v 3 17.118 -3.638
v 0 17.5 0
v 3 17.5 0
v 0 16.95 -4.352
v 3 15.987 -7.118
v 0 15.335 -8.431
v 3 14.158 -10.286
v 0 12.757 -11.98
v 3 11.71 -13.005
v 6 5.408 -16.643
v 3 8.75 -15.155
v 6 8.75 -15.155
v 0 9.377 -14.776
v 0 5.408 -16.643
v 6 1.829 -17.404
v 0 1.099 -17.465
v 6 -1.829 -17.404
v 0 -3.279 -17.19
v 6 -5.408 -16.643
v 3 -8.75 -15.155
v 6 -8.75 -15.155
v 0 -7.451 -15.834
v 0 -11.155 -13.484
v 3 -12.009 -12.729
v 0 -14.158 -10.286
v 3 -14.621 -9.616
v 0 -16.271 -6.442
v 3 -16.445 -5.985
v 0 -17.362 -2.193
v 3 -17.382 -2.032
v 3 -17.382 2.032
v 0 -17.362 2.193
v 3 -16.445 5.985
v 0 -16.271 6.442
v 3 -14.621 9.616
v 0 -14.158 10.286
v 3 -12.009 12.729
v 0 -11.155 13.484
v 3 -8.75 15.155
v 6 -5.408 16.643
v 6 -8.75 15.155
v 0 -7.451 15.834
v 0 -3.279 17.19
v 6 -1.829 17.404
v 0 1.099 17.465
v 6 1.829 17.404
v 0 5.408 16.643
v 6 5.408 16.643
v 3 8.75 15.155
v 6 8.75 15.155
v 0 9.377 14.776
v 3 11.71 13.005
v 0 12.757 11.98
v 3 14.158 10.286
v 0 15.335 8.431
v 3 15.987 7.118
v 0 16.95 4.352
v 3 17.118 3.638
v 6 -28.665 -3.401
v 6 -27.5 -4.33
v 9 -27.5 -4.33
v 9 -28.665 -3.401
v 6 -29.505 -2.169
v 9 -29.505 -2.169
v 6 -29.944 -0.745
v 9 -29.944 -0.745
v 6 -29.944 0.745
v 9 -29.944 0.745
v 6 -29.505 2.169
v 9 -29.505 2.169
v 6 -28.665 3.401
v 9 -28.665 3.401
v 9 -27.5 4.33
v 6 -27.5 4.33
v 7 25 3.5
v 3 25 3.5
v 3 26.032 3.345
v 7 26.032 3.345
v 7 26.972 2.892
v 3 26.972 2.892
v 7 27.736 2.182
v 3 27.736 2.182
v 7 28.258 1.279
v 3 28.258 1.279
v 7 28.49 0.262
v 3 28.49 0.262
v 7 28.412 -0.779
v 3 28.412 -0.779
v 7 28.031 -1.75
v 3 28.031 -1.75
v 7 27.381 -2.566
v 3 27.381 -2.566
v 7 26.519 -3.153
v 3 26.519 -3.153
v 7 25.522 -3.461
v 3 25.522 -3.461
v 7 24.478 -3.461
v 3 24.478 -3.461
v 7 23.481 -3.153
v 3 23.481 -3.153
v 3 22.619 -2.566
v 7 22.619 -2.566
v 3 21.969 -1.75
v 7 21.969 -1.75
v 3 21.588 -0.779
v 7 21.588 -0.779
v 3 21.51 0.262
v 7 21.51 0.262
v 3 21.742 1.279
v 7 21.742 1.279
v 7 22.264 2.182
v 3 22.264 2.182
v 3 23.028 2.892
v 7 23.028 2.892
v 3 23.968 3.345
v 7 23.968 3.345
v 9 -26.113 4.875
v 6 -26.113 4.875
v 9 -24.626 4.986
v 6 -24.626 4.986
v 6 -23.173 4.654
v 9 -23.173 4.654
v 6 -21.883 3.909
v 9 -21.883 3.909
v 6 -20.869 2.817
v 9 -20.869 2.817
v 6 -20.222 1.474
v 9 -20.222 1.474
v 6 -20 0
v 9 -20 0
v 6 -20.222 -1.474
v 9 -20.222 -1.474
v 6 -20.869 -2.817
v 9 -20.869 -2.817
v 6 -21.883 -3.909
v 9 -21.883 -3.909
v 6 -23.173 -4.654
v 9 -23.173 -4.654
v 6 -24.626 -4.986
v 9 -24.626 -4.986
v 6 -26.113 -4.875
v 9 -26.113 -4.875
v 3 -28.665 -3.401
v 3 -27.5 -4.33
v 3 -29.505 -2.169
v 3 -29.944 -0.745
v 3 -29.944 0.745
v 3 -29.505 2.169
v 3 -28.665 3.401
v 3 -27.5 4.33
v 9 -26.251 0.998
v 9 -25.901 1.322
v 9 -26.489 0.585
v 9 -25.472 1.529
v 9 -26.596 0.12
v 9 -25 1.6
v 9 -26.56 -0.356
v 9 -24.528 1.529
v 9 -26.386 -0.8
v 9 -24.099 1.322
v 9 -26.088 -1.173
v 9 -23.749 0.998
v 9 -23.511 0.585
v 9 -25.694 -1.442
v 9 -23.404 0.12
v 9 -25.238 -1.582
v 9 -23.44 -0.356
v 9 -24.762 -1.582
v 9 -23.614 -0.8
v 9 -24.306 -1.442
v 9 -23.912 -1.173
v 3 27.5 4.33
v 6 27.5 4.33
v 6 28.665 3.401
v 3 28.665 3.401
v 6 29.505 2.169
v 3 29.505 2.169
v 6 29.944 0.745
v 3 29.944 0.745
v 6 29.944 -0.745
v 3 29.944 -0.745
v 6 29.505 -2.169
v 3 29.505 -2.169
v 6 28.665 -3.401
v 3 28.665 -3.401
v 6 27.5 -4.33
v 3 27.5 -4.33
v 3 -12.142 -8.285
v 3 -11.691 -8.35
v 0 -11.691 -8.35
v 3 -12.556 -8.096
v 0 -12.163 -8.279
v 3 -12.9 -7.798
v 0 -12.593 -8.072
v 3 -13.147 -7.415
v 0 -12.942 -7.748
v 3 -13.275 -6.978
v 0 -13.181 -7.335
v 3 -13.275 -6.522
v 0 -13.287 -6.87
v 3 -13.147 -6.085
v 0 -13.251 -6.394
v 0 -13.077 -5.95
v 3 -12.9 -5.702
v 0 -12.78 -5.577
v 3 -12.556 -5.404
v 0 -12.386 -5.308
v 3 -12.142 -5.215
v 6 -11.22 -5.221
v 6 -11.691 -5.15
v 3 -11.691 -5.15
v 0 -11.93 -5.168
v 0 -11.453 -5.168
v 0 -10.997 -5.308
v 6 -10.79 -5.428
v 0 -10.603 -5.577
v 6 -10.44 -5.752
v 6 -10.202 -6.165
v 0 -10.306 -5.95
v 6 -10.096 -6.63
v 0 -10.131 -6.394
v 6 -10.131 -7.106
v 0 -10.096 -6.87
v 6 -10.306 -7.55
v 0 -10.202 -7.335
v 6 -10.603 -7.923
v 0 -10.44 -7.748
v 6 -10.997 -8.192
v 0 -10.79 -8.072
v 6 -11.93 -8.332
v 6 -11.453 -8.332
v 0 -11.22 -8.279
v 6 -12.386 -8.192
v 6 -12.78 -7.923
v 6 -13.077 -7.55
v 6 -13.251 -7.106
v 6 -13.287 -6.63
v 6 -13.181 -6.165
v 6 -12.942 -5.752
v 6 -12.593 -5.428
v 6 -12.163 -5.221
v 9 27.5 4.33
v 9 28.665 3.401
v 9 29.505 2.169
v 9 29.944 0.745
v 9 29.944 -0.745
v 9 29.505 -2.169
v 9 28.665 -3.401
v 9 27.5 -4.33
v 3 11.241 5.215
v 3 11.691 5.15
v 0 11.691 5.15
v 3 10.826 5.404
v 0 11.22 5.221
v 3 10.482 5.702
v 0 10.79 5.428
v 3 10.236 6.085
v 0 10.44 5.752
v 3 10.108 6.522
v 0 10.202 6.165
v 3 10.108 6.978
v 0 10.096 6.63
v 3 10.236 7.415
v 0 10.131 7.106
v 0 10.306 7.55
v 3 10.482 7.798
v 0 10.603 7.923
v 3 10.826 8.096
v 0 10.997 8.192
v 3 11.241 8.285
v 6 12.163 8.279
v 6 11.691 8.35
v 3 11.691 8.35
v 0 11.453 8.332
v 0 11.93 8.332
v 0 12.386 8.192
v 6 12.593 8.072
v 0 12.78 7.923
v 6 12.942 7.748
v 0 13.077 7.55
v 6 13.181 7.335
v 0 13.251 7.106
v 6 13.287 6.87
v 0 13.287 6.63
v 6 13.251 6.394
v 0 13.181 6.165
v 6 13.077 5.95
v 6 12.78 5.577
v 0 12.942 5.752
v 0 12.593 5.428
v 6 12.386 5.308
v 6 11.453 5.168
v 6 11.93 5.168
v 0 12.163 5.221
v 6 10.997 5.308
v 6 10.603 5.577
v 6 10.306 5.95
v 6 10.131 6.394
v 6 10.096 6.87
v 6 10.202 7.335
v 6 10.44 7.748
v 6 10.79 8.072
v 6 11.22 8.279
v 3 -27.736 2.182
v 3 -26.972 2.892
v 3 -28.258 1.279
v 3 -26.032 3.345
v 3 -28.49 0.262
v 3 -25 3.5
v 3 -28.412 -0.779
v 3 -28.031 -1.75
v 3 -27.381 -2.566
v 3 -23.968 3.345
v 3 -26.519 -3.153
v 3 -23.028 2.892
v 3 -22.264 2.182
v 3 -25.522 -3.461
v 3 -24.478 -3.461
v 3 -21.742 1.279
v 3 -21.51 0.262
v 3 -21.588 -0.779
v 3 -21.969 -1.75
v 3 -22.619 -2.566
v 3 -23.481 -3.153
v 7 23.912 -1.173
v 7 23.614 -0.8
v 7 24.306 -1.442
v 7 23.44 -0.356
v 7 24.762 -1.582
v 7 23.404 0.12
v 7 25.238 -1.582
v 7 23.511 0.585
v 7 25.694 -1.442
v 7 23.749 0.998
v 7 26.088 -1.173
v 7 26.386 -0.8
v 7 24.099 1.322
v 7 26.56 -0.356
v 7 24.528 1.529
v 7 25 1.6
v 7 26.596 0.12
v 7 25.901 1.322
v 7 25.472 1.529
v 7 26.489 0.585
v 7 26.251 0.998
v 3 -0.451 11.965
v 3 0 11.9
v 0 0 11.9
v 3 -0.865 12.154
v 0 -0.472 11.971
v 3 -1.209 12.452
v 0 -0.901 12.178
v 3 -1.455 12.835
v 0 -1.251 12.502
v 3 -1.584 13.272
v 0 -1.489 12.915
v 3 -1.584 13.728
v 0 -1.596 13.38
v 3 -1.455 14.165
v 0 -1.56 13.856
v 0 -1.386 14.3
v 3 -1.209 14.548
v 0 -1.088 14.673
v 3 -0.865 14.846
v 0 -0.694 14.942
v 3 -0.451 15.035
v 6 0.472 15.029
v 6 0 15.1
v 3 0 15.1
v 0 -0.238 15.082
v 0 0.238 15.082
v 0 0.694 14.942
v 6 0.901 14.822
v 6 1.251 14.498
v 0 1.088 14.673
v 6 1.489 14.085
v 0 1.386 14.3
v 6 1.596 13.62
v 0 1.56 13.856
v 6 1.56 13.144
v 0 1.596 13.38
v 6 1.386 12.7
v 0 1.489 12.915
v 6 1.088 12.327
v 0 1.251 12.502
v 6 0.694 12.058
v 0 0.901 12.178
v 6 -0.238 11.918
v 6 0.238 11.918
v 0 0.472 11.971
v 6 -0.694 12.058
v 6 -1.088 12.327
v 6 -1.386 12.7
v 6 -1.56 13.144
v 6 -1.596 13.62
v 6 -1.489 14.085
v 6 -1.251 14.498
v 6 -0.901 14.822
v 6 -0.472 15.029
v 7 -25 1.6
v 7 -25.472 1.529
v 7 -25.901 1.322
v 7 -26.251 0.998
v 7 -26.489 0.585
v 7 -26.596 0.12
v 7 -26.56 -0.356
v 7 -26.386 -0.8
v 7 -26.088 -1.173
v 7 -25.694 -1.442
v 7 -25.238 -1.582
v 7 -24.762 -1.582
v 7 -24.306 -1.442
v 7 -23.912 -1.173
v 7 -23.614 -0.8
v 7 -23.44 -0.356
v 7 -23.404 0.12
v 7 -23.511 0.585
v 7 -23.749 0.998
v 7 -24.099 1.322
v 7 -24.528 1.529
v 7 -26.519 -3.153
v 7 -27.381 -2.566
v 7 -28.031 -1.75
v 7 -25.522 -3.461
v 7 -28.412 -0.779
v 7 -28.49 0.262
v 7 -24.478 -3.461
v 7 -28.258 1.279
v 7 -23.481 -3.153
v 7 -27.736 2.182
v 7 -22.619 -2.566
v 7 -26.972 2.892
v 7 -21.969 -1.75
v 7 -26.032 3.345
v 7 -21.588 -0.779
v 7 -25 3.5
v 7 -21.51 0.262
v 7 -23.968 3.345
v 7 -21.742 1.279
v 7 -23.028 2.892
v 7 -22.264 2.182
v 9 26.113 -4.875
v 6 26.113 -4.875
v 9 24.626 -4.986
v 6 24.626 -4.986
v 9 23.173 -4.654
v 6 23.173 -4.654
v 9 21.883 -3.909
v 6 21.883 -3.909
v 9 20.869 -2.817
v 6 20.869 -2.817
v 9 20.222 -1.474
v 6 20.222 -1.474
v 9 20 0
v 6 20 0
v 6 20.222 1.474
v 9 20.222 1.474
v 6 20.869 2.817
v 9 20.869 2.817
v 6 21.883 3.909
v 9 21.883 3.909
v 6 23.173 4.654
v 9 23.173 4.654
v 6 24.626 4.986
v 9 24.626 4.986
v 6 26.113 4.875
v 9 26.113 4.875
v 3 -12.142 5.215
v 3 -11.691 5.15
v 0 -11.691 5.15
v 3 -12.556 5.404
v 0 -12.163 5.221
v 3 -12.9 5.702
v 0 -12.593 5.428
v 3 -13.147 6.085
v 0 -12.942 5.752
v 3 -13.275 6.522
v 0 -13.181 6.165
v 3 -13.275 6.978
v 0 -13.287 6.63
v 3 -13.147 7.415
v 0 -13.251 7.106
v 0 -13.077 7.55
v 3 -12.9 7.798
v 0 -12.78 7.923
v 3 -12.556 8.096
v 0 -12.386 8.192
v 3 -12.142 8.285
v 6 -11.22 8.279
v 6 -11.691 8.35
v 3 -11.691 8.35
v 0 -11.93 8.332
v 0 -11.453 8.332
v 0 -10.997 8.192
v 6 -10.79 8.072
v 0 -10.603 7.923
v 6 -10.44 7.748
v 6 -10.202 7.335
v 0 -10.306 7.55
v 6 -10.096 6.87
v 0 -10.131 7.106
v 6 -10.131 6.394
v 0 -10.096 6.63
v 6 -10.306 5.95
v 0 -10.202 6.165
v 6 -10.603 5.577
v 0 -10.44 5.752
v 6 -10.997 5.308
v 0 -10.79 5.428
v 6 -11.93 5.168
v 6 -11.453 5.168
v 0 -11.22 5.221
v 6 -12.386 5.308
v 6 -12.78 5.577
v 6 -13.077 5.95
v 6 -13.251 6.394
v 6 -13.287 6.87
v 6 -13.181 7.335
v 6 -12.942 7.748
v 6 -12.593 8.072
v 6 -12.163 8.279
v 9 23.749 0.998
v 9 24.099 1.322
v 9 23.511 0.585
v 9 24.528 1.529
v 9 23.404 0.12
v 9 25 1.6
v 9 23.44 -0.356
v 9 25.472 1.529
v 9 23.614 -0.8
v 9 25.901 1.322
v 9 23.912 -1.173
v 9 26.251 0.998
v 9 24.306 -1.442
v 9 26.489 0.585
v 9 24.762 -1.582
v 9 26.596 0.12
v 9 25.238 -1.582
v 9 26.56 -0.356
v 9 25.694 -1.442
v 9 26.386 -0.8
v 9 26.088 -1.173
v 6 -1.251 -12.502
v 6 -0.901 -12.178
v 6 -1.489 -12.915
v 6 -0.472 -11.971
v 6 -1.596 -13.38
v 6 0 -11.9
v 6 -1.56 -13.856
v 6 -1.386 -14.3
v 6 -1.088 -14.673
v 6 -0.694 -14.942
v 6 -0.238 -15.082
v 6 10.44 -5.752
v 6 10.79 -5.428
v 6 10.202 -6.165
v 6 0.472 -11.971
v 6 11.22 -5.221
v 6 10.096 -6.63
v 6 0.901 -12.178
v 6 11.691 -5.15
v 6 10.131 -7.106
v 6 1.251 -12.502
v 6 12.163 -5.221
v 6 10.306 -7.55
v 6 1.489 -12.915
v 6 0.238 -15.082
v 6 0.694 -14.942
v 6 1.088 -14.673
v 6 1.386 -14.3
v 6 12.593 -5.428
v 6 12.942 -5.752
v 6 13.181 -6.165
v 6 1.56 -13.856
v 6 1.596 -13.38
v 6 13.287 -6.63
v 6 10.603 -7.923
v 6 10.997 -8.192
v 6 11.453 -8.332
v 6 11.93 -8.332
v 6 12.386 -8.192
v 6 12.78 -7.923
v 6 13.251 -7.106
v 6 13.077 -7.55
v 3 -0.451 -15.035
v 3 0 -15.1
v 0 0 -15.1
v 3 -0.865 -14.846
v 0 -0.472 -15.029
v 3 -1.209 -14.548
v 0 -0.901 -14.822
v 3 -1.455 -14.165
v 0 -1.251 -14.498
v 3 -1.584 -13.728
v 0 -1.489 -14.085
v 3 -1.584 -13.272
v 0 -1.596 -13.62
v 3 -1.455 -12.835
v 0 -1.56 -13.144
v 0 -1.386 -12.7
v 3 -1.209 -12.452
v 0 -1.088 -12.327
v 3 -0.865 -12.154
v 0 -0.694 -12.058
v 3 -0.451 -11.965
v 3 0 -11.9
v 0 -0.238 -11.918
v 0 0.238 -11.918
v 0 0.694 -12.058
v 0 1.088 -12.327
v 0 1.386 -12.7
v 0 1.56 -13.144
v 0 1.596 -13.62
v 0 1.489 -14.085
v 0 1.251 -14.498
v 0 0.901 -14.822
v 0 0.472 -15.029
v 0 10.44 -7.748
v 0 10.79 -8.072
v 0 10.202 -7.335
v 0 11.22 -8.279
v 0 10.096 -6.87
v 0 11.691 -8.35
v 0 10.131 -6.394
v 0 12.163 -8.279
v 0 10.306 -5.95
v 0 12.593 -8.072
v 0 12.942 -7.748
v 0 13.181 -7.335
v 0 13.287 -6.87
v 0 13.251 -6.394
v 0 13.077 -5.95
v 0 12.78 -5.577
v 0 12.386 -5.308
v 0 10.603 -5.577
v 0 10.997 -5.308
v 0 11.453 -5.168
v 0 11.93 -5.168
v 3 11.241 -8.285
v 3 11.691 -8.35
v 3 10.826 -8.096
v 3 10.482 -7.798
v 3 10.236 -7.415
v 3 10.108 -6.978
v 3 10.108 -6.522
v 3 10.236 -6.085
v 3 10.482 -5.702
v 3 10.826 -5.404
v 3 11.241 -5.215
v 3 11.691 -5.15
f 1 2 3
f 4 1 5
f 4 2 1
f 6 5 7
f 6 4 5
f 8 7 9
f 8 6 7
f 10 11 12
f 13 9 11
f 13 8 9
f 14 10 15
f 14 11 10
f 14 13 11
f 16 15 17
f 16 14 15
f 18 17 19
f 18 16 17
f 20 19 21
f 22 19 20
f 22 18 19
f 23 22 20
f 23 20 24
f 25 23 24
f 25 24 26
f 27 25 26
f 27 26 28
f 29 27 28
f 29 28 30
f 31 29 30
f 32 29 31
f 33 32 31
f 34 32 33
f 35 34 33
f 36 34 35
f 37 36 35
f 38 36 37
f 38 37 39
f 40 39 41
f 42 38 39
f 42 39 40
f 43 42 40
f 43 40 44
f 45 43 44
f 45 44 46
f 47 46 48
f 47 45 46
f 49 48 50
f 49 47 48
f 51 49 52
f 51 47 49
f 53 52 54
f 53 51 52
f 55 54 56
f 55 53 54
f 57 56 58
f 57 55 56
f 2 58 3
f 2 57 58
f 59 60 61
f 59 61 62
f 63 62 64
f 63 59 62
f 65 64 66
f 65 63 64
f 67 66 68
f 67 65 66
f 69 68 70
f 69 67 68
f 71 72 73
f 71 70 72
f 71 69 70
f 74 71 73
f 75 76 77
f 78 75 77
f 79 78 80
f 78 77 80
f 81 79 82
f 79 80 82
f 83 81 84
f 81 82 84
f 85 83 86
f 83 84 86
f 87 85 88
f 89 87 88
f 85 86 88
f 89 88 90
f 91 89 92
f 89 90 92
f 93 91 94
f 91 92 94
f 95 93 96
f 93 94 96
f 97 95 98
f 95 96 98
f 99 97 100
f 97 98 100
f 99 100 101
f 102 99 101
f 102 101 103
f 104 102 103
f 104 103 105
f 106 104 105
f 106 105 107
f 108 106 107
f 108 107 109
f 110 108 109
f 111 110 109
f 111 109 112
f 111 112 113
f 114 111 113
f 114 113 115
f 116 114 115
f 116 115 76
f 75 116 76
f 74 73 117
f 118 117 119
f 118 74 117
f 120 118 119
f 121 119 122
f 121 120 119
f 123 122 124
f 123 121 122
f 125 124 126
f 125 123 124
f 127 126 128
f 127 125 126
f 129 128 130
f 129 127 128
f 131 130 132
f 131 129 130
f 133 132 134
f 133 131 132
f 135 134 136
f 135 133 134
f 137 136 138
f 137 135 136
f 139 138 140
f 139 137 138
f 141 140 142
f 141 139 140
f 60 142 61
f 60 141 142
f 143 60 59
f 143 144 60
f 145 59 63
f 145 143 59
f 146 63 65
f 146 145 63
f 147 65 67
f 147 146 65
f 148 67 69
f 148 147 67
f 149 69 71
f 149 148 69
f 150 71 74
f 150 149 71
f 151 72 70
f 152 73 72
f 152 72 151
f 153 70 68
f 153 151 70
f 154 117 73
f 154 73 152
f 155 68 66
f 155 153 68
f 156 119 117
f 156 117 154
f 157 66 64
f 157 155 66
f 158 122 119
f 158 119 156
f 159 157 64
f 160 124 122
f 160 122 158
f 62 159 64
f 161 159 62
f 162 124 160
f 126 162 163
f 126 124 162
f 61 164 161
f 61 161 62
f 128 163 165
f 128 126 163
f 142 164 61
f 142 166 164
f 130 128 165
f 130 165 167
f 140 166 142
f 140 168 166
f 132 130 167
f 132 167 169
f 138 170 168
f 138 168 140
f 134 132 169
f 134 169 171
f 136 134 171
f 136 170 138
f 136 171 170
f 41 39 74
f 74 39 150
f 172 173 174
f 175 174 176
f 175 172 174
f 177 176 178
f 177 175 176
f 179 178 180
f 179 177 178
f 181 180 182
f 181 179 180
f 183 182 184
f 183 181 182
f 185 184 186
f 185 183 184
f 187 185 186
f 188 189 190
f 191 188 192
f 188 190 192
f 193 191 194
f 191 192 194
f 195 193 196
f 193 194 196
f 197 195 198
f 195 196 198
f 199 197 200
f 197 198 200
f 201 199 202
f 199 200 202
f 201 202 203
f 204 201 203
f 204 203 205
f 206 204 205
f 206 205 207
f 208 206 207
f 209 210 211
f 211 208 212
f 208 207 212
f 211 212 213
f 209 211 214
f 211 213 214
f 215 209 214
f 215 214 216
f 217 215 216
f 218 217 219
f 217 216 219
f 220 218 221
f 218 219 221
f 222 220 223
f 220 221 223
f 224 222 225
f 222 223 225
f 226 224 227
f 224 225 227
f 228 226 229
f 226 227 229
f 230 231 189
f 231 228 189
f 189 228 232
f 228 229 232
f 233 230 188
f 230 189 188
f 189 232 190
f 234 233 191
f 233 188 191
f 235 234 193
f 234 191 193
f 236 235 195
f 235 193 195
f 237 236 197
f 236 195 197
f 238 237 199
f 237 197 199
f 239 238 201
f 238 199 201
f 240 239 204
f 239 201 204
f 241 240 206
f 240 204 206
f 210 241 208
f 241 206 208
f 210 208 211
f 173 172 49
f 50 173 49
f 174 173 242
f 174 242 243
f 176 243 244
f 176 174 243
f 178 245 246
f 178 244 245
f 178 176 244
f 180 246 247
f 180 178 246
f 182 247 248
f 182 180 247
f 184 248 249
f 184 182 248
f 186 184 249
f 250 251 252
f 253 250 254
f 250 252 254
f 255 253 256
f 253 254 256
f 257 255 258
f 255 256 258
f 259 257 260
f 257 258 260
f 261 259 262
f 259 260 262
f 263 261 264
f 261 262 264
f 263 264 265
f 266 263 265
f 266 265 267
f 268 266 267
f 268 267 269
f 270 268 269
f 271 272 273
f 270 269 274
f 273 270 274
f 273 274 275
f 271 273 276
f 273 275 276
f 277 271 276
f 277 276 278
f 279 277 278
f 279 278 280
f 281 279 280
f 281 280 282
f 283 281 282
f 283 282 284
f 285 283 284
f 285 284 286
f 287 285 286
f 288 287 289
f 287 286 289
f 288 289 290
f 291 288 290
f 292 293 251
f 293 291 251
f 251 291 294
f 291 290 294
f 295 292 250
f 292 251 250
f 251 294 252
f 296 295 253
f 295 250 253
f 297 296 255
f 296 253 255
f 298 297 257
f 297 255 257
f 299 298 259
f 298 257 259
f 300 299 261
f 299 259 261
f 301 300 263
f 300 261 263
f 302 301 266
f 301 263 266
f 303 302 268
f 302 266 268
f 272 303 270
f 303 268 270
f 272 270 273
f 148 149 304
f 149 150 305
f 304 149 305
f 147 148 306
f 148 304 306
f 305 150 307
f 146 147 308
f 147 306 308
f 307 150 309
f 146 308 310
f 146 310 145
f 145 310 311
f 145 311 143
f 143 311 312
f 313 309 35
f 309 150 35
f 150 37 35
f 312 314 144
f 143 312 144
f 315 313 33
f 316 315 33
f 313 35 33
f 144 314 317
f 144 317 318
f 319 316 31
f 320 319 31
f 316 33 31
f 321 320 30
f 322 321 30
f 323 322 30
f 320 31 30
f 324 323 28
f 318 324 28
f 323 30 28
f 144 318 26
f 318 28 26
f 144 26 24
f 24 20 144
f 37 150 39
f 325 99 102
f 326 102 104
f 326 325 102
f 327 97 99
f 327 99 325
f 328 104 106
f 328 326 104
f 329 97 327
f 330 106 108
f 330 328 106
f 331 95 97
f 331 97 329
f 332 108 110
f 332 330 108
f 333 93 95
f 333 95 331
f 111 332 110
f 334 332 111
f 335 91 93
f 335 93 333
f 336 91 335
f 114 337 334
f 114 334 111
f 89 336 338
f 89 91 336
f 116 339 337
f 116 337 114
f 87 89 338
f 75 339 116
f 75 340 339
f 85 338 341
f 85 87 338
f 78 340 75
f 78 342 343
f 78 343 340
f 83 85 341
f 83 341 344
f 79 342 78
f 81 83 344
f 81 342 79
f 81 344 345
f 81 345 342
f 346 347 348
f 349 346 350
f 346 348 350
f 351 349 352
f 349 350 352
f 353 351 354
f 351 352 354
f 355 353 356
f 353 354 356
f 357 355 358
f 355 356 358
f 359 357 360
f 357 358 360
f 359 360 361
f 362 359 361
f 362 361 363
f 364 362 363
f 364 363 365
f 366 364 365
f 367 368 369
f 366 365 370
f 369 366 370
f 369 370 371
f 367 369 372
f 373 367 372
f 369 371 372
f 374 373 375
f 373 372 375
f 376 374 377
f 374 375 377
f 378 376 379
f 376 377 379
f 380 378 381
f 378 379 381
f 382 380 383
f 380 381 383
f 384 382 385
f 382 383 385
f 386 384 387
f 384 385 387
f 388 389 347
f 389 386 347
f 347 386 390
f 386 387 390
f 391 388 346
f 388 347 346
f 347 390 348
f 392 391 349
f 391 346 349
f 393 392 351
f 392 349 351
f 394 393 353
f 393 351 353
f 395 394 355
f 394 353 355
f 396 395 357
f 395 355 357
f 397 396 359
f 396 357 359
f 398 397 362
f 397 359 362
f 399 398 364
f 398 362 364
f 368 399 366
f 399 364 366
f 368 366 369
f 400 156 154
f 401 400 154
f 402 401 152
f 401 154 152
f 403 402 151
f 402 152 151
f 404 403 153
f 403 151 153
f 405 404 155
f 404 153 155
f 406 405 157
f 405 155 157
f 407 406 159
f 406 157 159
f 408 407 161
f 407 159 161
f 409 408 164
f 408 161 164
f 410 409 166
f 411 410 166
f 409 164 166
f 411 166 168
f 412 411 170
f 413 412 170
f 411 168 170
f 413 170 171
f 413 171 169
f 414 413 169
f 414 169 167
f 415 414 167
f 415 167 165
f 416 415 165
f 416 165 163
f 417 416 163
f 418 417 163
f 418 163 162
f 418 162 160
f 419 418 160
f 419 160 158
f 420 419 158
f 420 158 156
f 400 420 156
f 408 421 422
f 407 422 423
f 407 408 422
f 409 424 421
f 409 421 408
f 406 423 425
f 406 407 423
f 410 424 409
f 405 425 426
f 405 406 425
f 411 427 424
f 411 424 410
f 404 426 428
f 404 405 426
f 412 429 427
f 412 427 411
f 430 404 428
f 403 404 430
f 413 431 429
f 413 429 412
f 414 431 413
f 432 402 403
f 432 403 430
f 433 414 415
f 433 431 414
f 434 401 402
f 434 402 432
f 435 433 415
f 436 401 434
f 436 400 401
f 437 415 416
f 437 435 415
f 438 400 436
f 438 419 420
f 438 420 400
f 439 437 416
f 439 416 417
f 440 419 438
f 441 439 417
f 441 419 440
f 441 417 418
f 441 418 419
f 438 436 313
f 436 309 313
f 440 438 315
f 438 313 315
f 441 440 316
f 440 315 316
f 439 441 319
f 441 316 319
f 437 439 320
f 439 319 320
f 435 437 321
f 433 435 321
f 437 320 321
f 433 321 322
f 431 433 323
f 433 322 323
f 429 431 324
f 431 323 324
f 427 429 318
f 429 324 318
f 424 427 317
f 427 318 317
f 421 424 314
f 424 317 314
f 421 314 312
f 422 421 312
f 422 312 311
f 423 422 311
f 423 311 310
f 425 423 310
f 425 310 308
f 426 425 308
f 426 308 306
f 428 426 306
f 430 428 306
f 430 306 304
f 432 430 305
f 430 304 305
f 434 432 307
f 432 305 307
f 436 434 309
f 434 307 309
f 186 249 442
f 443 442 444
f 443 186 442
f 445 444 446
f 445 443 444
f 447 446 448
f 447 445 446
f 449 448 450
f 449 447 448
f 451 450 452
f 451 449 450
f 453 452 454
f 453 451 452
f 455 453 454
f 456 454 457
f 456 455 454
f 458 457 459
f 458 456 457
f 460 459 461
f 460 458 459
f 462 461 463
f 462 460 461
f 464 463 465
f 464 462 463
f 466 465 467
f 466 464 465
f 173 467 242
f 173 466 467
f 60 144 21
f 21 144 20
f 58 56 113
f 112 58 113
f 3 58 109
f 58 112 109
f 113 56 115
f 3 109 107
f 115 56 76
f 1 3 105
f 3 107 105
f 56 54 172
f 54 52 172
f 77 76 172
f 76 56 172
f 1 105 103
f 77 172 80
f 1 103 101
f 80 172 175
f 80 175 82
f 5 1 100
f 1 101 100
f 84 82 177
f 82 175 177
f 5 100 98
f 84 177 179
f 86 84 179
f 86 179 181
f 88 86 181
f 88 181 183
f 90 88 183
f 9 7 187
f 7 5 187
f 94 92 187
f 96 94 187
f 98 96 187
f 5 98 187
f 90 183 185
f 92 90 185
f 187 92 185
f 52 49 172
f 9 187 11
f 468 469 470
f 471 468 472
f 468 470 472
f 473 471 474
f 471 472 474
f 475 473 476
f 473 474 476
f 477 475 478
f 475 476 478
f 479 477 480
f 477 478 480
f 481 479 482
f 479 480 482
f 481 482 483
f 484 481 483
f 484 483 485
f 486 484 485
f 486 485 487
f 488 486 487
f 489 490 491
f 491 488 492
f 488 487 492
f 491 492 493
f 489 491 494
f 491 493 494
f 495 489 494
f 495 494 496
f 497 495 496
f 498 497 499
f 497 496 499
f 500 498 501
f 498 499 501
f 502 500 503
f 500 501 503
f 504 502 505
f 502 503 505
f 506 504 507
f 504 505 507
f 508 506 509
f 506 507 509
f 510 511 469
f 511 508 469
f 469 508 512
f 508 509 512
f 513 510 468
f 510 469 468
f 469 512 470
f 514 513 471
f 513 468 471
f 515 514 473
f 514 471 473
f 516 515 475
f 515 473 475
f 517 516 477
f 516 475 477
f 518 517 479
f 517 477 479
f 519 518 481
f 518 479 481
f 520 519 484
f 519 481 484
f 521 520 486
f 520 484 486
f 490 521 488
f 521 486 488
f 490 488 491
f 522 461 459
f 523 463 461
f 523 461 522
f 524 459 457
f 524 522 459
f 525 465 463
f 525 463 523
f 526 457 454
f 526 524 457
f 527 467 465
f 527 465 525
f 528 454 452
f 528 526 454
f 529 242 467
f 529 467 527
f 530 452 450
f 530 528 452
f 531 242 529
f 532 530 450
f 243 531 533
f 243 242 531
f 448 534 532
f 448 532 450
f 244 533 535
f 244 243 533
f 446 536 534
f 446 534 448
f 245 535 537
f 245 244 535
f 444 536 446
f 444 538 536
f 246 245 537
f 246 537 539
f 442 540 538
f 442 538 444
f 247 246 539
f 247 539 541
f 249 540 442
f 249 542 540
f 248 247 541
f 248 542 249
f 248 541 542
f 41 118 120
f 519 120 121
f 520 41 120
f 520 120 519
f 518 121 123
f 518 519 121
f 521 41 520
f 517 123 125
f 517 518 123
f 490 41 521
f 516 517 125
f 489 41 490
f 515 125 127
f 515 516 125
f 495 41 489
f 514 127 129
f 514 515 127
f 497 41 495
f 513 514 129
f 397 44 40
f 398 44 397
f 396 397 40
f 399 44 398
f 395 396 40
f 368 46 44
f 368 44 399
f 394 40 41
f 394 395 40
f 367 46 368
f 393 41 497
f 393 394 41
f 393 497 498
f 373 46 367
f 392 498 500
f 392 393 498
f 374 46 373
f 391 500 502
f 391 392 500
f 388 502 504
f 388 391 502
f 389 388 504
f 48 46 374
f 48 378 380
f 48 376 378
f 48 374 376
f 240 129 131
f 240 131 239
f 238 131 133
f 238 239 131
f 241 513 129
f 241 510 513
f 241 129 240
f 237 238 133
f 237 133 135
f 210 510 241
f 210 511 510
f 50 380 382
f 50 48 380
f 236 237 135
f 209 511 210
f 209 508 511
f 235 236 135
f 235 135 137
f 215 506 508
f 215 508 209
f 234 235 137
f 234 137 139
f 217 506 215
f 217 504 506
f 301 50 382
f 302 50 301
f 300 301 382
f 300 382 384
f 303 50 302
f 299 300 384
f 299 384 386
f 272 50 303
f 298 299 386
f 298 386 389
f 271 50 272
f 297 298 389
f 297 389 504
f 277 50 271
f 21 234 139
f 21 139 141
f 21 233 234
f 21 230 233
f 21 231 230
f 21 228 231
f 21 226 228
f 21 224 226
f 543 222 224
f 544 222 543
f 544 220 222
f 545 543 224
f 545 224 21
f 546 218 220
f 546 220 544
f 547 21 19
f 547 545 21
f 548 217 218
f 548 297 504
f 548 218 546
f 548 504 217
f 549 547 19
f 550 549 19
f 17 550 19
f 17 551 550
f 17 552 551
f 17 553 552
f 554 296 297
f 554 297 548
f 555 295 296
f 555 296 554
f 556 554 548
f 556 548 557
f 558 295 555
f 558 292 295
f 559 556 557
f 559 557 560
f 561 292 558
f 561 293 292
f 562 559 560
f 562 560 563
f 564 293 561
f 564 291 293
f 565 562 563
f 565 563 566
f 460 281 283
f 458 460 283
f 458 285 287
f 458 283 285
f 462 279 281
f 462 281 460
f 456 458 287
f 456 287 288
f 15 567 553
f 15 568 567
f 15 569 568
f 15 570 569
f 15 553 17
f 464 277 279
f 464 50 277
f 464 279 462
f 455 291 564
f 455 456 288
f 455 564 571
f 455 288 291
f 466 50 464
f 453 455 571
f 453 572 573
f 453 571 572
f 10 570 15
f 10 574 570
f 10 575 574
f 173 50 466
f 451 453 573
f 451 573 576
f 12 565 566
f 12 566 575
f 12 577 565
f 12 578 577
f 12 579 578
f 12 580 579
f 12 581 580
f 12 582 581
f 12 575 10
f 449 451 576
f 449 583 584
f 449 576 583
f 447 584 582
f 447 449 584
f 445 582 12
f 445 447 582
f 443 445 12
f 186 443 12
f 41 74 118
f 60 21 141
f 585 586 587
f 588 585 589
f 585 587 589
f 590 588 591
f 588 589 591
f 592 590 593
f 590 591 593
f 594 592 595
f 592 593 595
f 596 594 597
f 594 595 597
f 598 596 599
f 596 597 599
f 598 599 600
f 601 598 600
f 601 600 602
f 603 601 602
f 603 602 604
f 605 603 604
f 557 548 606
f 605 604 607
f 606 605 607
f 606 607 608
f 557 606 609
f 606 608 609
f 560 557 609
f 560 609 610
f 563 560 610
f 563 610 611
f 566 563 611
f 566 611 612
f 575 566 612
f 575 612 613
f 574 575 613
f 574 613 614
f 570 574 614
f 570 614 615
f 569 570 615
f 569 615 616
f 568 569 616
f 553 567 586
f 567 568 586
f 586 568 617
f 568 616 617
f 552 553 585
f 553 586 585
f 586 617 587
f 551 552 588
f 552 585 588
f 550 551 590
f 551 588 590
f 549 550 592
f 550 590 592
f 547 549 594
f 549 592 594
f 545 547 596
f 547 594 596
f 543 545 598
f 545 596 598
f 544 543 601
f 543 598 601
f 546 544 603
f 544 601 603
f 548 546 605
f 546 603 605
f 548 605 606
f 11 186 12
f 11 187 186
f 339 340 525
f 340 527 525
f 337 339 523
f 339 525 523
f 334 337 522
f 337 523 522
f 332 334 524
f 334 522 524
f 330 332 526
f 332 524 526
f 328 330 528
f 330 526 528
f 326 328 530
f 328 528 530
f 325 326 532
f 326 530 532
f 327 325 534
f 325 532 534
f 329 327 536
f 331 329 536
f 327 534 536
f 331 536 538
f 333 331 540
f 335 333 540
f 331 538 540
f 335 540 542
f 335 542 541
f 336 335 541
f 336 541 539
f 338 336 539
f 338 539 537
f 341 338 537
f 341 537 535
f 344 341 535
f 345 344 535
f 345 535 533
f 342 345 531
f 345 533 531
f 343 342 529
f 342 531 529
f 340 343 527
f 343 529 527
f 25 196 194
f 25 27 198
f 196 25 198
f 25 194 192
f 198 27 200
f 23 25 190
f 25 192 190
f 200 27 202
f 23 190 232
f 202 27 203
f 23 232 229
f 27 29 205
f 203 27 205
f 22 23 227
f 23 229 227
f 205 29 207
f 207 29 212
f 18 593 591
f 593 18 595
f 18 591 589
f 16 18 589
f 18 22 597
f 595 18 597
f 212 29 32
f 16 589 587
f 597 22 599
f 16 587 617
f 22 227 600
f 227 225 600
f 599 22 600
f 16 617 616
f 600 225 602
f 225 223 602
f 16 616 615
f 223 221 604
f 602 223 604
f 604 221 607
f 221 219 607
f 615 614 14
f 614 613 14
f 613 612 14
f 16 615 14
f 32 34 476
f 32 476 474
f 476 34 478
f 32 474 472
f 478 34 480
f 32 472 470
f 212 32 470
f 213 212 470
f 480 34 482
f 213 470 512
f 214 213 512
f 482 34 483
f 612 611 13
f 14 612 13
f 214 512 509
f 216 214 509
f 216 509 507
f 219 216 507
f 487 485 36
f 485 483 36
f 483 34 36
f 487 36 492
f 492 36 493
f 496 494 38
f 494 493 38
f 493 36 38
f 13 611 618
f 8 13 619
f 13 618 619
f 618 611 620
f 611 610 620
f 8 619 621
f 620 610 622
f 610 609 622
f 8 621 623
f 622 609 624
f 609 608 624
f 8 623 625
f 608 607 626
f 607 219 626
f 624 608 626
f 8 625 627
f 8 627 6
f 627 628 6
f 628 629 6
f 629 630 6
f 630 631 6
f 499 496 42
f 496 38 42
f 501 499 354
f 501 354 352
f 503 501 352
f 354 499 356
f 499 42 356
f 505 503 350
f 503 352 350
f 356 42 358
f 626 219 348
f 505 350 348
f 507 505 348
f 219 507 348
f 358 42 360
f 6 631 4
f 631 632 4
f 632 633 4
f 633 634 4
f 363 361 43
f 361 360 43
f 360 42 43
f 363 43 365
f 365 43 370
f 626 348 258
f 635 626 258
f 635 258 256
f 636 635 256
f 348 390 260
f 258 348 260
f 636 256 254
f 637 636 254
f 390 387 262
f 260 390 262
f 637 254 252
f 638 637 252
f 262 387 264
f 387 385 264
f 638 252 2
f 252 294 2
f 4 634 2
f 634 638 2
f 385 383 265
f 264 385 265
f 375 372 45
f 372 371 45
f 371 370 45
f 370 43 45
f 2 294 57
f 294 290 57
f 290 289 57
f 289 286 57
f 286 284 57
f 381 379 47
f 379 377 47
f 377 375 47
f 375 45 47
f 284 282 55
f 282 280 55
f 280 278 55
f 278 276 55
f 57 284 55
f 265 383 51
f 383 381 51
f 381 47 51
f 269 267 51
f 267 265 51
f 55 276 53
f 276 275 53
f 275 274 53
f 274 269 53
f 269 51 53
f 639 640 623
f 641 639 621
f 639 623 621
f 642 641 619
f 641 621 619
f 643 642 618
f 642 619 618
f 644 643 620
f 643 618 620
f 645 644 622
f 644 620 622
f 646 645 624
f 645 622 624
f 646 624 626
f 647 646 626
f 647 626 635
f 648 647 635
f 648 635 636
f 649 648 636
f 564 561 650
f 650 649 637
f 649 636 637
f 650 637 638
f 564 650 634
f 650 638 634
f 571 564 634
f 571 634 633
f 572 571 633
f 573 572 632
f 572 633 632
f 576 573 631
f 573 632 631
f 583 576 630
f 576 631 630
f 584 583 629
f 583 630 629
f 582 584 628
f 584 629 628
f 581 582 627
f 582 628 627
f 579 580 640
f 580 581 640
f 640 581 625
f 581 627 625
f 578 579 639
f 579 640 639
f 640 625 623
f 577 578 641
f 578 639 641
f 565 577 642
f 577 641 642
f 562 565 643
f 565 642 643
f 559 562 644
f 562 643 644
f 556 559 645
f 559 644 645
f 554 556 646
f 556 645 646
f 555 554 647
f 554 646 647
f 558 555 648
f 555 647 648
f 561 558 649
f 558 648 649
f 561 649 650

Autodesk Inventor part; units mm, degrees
ref_plane "YZ Plane" through (0, 0, 0) normal (1, 0, 0) x (0, 1, 0)
ref_plane "XZ Plane" through (0, 0, 0) normal (0, 1, 0) x (-1, 0, 0)
ref_plane "XY Plane" through (0, 0, 0) normal (0, 0, 1) x (1, 0, 0)
sketch "スケッチ1" plane through (0, 0, 0) normal (1, 0, 0) x (0, 1, 0)
  circle A0 centre (0, 0) radius 17.5
  dimension "d0" = 35
extrude "押し出し1" add sketch "スケッチ1" along normal blind 3
sketch "スケッチ2" plane through (3, 0, 0) normal (1, 0, 0) x (0, 0, -1)
  circle A0 centre (0, 0) radius 13.5
  point P0 (13.5, 0)
  point P1 (6.75, 11.6913)
  point P2 (-6.75, 11.6913)
  point P3 (-13.5, 0)
  point P4 (-6.75, -11.6913)
  point P5 (6.75, -11.6913)
  dimension "d3" = 27
  dimension "d6" = 360
hole "穴1" at (3, 0, -13.5) at (3, 11.6913, -6.75) at (3, 11.6913, 6.75) at (3, 0, 13.5) at (3, -11.6913, 6.75) at (3, -11.6913, -6.75) direction (-1, 0, 0) diameter 3.2 end through all
sketch "スケッチ4" plane through (3, 0, 0) normal (1, 0, 0) x (0, 0, -1)
  circle A0 centre (0, 0) radius 25
  circle A1 centre (0, -25) radius 5
  circle A2 centre (0, 25) radius 5
  circle A3 centre (13.5, 0) radius 1.6 projected
  circle A4 centre (-13.5, 0) radius 1.6 projected
  line L0 (-1.8583, 31.7813) -> (-19.7652, 0.7657)
  line L1 (-19.9094, -0.516) -> (-0.3337, -34.4219)
  line L2 (1.1974, -32.9261) -> (19.8479, -0.6225)
  line L3 (2.1736, 31.2353) -> (21.8646, -2.8706)
  circle A5 centre (0, 0) radius 17.5 projected
  point P0 (-4.3301, 27.5)
  point P1 (-15.1554, 8.75)
  point P2 (-15.1554, -8.75)
  point P3 (-4.3301, -27.5)
  point P4 (4.3301, -27.5)
  point P5 (15.1554, -8.75)
  point P6 (15.1554, 8.75)
  point P7 (4.3301, 27.5)
  dimension "d22" = 50
  dimension "d23" = 10
  dimension "d24" = 10
  dimension "d25" = 13.5
  dimension "d26" = 13.5
extrude "押し出し2" add sketch "スケッチ4" along normal blind 3 contours L3 A5 L0 A0 A2 | A0 A2 L3 | L2 A1 A0 | A0 A1 L1 A5 L2 | A2 A0 | A0 A2 | A5 | A1 A0 | A0 A1 | A0 L0 A2 | A1 L1 A0 | A3 | A4
sketch "スケッチ6" plane through (6, 0, 0) normal (1, 0, 0) x (0, 0, -1)
  arc A0 (4.3301, 27.5) -> (-4.3301, 27.5) centre (0, 25) ccw projected
  circle A1 centre (0, 25) radius 5
  arc A2 (-4.3301, -27.5) -> (4.3301, -27.5) centre (0, -25) ccw projected
  circle A3 centre (0, -25) radius 5
  point P0 (0, 0)
  point P1 (-4.3301, 27.5)
  point P2 (4.3301, 27.5)
  dimension "d29" = 10
  dimension "d30" = 10
extrude "押し出し3" add sketch "スケッチ6" along normal blind 3
sketch "スケッチ7" plane through (0, 0, 0) normal (-1, 0, 0) x (0, 0, 1)
  circle A0 centre (6.75, 11.6913) radius 1.6 projected
  circle A1 centre (13.5, 0) radius 1.6 projected
  circle A2 centre (6.75, -11.6913) radius 1.6 projected
  circle A3 centre (-6.75, -11.6913) radius 1.6 projected
  circle A4 centre (-13.5, 0) radius 1.6 projected
  circle A5 centre (-6.75, 11.6913) radius 1.6 projected
  arc A6 (4.3301, 27.5) -> (-4.3301, 27.5) centre (0, 25) ccw projected
  arc A7 (-4.3301, -27.5) -> (4.3301, -27.5) centre (0, -25) ccw projected
  point P0 (0, 0)
hole "穴2" at (0, 11.6913, 6.75) at (0, 0, 13.5) at (0, -11.6913, 6.75) at (0, -11.6913, -6.75) at (0, 0, -13.5) at (0, 11.6913, -6.75) at (0, 25, 0) at (0, -25, 0) direction (1, 0, 0) diameter 3.2 end through all
sketch "スケッチ9" plane through (0, 0, 0) normal (-1, 0, 0) x (0, 0, 1)
  circle A0 centre (0, 25) radius 1.6 projected
  circle A1 centre (0, 25) radius 3.5
  circle A2 centre (0, -25) radius 1.6 projected
  circle A3 centre (0, -25) radius 3.5
  point P0 (0, 0)
  point P1 (0.5822, 17.4903)
  point P2 (-0.5822, 17.4903)
  point P3 (-0.5822, -17.4903)
  point P4 (0.5822, -17.4903)
  dimension "d40" = 7
  dimension "d41" = 7
extrude "押し出し4" cut sketch "スケッチ9" against normal blind 7 contours A0 | A1 | A2 | A3
properties part number "endeff_3dp2" material "ABS プラスチック"
